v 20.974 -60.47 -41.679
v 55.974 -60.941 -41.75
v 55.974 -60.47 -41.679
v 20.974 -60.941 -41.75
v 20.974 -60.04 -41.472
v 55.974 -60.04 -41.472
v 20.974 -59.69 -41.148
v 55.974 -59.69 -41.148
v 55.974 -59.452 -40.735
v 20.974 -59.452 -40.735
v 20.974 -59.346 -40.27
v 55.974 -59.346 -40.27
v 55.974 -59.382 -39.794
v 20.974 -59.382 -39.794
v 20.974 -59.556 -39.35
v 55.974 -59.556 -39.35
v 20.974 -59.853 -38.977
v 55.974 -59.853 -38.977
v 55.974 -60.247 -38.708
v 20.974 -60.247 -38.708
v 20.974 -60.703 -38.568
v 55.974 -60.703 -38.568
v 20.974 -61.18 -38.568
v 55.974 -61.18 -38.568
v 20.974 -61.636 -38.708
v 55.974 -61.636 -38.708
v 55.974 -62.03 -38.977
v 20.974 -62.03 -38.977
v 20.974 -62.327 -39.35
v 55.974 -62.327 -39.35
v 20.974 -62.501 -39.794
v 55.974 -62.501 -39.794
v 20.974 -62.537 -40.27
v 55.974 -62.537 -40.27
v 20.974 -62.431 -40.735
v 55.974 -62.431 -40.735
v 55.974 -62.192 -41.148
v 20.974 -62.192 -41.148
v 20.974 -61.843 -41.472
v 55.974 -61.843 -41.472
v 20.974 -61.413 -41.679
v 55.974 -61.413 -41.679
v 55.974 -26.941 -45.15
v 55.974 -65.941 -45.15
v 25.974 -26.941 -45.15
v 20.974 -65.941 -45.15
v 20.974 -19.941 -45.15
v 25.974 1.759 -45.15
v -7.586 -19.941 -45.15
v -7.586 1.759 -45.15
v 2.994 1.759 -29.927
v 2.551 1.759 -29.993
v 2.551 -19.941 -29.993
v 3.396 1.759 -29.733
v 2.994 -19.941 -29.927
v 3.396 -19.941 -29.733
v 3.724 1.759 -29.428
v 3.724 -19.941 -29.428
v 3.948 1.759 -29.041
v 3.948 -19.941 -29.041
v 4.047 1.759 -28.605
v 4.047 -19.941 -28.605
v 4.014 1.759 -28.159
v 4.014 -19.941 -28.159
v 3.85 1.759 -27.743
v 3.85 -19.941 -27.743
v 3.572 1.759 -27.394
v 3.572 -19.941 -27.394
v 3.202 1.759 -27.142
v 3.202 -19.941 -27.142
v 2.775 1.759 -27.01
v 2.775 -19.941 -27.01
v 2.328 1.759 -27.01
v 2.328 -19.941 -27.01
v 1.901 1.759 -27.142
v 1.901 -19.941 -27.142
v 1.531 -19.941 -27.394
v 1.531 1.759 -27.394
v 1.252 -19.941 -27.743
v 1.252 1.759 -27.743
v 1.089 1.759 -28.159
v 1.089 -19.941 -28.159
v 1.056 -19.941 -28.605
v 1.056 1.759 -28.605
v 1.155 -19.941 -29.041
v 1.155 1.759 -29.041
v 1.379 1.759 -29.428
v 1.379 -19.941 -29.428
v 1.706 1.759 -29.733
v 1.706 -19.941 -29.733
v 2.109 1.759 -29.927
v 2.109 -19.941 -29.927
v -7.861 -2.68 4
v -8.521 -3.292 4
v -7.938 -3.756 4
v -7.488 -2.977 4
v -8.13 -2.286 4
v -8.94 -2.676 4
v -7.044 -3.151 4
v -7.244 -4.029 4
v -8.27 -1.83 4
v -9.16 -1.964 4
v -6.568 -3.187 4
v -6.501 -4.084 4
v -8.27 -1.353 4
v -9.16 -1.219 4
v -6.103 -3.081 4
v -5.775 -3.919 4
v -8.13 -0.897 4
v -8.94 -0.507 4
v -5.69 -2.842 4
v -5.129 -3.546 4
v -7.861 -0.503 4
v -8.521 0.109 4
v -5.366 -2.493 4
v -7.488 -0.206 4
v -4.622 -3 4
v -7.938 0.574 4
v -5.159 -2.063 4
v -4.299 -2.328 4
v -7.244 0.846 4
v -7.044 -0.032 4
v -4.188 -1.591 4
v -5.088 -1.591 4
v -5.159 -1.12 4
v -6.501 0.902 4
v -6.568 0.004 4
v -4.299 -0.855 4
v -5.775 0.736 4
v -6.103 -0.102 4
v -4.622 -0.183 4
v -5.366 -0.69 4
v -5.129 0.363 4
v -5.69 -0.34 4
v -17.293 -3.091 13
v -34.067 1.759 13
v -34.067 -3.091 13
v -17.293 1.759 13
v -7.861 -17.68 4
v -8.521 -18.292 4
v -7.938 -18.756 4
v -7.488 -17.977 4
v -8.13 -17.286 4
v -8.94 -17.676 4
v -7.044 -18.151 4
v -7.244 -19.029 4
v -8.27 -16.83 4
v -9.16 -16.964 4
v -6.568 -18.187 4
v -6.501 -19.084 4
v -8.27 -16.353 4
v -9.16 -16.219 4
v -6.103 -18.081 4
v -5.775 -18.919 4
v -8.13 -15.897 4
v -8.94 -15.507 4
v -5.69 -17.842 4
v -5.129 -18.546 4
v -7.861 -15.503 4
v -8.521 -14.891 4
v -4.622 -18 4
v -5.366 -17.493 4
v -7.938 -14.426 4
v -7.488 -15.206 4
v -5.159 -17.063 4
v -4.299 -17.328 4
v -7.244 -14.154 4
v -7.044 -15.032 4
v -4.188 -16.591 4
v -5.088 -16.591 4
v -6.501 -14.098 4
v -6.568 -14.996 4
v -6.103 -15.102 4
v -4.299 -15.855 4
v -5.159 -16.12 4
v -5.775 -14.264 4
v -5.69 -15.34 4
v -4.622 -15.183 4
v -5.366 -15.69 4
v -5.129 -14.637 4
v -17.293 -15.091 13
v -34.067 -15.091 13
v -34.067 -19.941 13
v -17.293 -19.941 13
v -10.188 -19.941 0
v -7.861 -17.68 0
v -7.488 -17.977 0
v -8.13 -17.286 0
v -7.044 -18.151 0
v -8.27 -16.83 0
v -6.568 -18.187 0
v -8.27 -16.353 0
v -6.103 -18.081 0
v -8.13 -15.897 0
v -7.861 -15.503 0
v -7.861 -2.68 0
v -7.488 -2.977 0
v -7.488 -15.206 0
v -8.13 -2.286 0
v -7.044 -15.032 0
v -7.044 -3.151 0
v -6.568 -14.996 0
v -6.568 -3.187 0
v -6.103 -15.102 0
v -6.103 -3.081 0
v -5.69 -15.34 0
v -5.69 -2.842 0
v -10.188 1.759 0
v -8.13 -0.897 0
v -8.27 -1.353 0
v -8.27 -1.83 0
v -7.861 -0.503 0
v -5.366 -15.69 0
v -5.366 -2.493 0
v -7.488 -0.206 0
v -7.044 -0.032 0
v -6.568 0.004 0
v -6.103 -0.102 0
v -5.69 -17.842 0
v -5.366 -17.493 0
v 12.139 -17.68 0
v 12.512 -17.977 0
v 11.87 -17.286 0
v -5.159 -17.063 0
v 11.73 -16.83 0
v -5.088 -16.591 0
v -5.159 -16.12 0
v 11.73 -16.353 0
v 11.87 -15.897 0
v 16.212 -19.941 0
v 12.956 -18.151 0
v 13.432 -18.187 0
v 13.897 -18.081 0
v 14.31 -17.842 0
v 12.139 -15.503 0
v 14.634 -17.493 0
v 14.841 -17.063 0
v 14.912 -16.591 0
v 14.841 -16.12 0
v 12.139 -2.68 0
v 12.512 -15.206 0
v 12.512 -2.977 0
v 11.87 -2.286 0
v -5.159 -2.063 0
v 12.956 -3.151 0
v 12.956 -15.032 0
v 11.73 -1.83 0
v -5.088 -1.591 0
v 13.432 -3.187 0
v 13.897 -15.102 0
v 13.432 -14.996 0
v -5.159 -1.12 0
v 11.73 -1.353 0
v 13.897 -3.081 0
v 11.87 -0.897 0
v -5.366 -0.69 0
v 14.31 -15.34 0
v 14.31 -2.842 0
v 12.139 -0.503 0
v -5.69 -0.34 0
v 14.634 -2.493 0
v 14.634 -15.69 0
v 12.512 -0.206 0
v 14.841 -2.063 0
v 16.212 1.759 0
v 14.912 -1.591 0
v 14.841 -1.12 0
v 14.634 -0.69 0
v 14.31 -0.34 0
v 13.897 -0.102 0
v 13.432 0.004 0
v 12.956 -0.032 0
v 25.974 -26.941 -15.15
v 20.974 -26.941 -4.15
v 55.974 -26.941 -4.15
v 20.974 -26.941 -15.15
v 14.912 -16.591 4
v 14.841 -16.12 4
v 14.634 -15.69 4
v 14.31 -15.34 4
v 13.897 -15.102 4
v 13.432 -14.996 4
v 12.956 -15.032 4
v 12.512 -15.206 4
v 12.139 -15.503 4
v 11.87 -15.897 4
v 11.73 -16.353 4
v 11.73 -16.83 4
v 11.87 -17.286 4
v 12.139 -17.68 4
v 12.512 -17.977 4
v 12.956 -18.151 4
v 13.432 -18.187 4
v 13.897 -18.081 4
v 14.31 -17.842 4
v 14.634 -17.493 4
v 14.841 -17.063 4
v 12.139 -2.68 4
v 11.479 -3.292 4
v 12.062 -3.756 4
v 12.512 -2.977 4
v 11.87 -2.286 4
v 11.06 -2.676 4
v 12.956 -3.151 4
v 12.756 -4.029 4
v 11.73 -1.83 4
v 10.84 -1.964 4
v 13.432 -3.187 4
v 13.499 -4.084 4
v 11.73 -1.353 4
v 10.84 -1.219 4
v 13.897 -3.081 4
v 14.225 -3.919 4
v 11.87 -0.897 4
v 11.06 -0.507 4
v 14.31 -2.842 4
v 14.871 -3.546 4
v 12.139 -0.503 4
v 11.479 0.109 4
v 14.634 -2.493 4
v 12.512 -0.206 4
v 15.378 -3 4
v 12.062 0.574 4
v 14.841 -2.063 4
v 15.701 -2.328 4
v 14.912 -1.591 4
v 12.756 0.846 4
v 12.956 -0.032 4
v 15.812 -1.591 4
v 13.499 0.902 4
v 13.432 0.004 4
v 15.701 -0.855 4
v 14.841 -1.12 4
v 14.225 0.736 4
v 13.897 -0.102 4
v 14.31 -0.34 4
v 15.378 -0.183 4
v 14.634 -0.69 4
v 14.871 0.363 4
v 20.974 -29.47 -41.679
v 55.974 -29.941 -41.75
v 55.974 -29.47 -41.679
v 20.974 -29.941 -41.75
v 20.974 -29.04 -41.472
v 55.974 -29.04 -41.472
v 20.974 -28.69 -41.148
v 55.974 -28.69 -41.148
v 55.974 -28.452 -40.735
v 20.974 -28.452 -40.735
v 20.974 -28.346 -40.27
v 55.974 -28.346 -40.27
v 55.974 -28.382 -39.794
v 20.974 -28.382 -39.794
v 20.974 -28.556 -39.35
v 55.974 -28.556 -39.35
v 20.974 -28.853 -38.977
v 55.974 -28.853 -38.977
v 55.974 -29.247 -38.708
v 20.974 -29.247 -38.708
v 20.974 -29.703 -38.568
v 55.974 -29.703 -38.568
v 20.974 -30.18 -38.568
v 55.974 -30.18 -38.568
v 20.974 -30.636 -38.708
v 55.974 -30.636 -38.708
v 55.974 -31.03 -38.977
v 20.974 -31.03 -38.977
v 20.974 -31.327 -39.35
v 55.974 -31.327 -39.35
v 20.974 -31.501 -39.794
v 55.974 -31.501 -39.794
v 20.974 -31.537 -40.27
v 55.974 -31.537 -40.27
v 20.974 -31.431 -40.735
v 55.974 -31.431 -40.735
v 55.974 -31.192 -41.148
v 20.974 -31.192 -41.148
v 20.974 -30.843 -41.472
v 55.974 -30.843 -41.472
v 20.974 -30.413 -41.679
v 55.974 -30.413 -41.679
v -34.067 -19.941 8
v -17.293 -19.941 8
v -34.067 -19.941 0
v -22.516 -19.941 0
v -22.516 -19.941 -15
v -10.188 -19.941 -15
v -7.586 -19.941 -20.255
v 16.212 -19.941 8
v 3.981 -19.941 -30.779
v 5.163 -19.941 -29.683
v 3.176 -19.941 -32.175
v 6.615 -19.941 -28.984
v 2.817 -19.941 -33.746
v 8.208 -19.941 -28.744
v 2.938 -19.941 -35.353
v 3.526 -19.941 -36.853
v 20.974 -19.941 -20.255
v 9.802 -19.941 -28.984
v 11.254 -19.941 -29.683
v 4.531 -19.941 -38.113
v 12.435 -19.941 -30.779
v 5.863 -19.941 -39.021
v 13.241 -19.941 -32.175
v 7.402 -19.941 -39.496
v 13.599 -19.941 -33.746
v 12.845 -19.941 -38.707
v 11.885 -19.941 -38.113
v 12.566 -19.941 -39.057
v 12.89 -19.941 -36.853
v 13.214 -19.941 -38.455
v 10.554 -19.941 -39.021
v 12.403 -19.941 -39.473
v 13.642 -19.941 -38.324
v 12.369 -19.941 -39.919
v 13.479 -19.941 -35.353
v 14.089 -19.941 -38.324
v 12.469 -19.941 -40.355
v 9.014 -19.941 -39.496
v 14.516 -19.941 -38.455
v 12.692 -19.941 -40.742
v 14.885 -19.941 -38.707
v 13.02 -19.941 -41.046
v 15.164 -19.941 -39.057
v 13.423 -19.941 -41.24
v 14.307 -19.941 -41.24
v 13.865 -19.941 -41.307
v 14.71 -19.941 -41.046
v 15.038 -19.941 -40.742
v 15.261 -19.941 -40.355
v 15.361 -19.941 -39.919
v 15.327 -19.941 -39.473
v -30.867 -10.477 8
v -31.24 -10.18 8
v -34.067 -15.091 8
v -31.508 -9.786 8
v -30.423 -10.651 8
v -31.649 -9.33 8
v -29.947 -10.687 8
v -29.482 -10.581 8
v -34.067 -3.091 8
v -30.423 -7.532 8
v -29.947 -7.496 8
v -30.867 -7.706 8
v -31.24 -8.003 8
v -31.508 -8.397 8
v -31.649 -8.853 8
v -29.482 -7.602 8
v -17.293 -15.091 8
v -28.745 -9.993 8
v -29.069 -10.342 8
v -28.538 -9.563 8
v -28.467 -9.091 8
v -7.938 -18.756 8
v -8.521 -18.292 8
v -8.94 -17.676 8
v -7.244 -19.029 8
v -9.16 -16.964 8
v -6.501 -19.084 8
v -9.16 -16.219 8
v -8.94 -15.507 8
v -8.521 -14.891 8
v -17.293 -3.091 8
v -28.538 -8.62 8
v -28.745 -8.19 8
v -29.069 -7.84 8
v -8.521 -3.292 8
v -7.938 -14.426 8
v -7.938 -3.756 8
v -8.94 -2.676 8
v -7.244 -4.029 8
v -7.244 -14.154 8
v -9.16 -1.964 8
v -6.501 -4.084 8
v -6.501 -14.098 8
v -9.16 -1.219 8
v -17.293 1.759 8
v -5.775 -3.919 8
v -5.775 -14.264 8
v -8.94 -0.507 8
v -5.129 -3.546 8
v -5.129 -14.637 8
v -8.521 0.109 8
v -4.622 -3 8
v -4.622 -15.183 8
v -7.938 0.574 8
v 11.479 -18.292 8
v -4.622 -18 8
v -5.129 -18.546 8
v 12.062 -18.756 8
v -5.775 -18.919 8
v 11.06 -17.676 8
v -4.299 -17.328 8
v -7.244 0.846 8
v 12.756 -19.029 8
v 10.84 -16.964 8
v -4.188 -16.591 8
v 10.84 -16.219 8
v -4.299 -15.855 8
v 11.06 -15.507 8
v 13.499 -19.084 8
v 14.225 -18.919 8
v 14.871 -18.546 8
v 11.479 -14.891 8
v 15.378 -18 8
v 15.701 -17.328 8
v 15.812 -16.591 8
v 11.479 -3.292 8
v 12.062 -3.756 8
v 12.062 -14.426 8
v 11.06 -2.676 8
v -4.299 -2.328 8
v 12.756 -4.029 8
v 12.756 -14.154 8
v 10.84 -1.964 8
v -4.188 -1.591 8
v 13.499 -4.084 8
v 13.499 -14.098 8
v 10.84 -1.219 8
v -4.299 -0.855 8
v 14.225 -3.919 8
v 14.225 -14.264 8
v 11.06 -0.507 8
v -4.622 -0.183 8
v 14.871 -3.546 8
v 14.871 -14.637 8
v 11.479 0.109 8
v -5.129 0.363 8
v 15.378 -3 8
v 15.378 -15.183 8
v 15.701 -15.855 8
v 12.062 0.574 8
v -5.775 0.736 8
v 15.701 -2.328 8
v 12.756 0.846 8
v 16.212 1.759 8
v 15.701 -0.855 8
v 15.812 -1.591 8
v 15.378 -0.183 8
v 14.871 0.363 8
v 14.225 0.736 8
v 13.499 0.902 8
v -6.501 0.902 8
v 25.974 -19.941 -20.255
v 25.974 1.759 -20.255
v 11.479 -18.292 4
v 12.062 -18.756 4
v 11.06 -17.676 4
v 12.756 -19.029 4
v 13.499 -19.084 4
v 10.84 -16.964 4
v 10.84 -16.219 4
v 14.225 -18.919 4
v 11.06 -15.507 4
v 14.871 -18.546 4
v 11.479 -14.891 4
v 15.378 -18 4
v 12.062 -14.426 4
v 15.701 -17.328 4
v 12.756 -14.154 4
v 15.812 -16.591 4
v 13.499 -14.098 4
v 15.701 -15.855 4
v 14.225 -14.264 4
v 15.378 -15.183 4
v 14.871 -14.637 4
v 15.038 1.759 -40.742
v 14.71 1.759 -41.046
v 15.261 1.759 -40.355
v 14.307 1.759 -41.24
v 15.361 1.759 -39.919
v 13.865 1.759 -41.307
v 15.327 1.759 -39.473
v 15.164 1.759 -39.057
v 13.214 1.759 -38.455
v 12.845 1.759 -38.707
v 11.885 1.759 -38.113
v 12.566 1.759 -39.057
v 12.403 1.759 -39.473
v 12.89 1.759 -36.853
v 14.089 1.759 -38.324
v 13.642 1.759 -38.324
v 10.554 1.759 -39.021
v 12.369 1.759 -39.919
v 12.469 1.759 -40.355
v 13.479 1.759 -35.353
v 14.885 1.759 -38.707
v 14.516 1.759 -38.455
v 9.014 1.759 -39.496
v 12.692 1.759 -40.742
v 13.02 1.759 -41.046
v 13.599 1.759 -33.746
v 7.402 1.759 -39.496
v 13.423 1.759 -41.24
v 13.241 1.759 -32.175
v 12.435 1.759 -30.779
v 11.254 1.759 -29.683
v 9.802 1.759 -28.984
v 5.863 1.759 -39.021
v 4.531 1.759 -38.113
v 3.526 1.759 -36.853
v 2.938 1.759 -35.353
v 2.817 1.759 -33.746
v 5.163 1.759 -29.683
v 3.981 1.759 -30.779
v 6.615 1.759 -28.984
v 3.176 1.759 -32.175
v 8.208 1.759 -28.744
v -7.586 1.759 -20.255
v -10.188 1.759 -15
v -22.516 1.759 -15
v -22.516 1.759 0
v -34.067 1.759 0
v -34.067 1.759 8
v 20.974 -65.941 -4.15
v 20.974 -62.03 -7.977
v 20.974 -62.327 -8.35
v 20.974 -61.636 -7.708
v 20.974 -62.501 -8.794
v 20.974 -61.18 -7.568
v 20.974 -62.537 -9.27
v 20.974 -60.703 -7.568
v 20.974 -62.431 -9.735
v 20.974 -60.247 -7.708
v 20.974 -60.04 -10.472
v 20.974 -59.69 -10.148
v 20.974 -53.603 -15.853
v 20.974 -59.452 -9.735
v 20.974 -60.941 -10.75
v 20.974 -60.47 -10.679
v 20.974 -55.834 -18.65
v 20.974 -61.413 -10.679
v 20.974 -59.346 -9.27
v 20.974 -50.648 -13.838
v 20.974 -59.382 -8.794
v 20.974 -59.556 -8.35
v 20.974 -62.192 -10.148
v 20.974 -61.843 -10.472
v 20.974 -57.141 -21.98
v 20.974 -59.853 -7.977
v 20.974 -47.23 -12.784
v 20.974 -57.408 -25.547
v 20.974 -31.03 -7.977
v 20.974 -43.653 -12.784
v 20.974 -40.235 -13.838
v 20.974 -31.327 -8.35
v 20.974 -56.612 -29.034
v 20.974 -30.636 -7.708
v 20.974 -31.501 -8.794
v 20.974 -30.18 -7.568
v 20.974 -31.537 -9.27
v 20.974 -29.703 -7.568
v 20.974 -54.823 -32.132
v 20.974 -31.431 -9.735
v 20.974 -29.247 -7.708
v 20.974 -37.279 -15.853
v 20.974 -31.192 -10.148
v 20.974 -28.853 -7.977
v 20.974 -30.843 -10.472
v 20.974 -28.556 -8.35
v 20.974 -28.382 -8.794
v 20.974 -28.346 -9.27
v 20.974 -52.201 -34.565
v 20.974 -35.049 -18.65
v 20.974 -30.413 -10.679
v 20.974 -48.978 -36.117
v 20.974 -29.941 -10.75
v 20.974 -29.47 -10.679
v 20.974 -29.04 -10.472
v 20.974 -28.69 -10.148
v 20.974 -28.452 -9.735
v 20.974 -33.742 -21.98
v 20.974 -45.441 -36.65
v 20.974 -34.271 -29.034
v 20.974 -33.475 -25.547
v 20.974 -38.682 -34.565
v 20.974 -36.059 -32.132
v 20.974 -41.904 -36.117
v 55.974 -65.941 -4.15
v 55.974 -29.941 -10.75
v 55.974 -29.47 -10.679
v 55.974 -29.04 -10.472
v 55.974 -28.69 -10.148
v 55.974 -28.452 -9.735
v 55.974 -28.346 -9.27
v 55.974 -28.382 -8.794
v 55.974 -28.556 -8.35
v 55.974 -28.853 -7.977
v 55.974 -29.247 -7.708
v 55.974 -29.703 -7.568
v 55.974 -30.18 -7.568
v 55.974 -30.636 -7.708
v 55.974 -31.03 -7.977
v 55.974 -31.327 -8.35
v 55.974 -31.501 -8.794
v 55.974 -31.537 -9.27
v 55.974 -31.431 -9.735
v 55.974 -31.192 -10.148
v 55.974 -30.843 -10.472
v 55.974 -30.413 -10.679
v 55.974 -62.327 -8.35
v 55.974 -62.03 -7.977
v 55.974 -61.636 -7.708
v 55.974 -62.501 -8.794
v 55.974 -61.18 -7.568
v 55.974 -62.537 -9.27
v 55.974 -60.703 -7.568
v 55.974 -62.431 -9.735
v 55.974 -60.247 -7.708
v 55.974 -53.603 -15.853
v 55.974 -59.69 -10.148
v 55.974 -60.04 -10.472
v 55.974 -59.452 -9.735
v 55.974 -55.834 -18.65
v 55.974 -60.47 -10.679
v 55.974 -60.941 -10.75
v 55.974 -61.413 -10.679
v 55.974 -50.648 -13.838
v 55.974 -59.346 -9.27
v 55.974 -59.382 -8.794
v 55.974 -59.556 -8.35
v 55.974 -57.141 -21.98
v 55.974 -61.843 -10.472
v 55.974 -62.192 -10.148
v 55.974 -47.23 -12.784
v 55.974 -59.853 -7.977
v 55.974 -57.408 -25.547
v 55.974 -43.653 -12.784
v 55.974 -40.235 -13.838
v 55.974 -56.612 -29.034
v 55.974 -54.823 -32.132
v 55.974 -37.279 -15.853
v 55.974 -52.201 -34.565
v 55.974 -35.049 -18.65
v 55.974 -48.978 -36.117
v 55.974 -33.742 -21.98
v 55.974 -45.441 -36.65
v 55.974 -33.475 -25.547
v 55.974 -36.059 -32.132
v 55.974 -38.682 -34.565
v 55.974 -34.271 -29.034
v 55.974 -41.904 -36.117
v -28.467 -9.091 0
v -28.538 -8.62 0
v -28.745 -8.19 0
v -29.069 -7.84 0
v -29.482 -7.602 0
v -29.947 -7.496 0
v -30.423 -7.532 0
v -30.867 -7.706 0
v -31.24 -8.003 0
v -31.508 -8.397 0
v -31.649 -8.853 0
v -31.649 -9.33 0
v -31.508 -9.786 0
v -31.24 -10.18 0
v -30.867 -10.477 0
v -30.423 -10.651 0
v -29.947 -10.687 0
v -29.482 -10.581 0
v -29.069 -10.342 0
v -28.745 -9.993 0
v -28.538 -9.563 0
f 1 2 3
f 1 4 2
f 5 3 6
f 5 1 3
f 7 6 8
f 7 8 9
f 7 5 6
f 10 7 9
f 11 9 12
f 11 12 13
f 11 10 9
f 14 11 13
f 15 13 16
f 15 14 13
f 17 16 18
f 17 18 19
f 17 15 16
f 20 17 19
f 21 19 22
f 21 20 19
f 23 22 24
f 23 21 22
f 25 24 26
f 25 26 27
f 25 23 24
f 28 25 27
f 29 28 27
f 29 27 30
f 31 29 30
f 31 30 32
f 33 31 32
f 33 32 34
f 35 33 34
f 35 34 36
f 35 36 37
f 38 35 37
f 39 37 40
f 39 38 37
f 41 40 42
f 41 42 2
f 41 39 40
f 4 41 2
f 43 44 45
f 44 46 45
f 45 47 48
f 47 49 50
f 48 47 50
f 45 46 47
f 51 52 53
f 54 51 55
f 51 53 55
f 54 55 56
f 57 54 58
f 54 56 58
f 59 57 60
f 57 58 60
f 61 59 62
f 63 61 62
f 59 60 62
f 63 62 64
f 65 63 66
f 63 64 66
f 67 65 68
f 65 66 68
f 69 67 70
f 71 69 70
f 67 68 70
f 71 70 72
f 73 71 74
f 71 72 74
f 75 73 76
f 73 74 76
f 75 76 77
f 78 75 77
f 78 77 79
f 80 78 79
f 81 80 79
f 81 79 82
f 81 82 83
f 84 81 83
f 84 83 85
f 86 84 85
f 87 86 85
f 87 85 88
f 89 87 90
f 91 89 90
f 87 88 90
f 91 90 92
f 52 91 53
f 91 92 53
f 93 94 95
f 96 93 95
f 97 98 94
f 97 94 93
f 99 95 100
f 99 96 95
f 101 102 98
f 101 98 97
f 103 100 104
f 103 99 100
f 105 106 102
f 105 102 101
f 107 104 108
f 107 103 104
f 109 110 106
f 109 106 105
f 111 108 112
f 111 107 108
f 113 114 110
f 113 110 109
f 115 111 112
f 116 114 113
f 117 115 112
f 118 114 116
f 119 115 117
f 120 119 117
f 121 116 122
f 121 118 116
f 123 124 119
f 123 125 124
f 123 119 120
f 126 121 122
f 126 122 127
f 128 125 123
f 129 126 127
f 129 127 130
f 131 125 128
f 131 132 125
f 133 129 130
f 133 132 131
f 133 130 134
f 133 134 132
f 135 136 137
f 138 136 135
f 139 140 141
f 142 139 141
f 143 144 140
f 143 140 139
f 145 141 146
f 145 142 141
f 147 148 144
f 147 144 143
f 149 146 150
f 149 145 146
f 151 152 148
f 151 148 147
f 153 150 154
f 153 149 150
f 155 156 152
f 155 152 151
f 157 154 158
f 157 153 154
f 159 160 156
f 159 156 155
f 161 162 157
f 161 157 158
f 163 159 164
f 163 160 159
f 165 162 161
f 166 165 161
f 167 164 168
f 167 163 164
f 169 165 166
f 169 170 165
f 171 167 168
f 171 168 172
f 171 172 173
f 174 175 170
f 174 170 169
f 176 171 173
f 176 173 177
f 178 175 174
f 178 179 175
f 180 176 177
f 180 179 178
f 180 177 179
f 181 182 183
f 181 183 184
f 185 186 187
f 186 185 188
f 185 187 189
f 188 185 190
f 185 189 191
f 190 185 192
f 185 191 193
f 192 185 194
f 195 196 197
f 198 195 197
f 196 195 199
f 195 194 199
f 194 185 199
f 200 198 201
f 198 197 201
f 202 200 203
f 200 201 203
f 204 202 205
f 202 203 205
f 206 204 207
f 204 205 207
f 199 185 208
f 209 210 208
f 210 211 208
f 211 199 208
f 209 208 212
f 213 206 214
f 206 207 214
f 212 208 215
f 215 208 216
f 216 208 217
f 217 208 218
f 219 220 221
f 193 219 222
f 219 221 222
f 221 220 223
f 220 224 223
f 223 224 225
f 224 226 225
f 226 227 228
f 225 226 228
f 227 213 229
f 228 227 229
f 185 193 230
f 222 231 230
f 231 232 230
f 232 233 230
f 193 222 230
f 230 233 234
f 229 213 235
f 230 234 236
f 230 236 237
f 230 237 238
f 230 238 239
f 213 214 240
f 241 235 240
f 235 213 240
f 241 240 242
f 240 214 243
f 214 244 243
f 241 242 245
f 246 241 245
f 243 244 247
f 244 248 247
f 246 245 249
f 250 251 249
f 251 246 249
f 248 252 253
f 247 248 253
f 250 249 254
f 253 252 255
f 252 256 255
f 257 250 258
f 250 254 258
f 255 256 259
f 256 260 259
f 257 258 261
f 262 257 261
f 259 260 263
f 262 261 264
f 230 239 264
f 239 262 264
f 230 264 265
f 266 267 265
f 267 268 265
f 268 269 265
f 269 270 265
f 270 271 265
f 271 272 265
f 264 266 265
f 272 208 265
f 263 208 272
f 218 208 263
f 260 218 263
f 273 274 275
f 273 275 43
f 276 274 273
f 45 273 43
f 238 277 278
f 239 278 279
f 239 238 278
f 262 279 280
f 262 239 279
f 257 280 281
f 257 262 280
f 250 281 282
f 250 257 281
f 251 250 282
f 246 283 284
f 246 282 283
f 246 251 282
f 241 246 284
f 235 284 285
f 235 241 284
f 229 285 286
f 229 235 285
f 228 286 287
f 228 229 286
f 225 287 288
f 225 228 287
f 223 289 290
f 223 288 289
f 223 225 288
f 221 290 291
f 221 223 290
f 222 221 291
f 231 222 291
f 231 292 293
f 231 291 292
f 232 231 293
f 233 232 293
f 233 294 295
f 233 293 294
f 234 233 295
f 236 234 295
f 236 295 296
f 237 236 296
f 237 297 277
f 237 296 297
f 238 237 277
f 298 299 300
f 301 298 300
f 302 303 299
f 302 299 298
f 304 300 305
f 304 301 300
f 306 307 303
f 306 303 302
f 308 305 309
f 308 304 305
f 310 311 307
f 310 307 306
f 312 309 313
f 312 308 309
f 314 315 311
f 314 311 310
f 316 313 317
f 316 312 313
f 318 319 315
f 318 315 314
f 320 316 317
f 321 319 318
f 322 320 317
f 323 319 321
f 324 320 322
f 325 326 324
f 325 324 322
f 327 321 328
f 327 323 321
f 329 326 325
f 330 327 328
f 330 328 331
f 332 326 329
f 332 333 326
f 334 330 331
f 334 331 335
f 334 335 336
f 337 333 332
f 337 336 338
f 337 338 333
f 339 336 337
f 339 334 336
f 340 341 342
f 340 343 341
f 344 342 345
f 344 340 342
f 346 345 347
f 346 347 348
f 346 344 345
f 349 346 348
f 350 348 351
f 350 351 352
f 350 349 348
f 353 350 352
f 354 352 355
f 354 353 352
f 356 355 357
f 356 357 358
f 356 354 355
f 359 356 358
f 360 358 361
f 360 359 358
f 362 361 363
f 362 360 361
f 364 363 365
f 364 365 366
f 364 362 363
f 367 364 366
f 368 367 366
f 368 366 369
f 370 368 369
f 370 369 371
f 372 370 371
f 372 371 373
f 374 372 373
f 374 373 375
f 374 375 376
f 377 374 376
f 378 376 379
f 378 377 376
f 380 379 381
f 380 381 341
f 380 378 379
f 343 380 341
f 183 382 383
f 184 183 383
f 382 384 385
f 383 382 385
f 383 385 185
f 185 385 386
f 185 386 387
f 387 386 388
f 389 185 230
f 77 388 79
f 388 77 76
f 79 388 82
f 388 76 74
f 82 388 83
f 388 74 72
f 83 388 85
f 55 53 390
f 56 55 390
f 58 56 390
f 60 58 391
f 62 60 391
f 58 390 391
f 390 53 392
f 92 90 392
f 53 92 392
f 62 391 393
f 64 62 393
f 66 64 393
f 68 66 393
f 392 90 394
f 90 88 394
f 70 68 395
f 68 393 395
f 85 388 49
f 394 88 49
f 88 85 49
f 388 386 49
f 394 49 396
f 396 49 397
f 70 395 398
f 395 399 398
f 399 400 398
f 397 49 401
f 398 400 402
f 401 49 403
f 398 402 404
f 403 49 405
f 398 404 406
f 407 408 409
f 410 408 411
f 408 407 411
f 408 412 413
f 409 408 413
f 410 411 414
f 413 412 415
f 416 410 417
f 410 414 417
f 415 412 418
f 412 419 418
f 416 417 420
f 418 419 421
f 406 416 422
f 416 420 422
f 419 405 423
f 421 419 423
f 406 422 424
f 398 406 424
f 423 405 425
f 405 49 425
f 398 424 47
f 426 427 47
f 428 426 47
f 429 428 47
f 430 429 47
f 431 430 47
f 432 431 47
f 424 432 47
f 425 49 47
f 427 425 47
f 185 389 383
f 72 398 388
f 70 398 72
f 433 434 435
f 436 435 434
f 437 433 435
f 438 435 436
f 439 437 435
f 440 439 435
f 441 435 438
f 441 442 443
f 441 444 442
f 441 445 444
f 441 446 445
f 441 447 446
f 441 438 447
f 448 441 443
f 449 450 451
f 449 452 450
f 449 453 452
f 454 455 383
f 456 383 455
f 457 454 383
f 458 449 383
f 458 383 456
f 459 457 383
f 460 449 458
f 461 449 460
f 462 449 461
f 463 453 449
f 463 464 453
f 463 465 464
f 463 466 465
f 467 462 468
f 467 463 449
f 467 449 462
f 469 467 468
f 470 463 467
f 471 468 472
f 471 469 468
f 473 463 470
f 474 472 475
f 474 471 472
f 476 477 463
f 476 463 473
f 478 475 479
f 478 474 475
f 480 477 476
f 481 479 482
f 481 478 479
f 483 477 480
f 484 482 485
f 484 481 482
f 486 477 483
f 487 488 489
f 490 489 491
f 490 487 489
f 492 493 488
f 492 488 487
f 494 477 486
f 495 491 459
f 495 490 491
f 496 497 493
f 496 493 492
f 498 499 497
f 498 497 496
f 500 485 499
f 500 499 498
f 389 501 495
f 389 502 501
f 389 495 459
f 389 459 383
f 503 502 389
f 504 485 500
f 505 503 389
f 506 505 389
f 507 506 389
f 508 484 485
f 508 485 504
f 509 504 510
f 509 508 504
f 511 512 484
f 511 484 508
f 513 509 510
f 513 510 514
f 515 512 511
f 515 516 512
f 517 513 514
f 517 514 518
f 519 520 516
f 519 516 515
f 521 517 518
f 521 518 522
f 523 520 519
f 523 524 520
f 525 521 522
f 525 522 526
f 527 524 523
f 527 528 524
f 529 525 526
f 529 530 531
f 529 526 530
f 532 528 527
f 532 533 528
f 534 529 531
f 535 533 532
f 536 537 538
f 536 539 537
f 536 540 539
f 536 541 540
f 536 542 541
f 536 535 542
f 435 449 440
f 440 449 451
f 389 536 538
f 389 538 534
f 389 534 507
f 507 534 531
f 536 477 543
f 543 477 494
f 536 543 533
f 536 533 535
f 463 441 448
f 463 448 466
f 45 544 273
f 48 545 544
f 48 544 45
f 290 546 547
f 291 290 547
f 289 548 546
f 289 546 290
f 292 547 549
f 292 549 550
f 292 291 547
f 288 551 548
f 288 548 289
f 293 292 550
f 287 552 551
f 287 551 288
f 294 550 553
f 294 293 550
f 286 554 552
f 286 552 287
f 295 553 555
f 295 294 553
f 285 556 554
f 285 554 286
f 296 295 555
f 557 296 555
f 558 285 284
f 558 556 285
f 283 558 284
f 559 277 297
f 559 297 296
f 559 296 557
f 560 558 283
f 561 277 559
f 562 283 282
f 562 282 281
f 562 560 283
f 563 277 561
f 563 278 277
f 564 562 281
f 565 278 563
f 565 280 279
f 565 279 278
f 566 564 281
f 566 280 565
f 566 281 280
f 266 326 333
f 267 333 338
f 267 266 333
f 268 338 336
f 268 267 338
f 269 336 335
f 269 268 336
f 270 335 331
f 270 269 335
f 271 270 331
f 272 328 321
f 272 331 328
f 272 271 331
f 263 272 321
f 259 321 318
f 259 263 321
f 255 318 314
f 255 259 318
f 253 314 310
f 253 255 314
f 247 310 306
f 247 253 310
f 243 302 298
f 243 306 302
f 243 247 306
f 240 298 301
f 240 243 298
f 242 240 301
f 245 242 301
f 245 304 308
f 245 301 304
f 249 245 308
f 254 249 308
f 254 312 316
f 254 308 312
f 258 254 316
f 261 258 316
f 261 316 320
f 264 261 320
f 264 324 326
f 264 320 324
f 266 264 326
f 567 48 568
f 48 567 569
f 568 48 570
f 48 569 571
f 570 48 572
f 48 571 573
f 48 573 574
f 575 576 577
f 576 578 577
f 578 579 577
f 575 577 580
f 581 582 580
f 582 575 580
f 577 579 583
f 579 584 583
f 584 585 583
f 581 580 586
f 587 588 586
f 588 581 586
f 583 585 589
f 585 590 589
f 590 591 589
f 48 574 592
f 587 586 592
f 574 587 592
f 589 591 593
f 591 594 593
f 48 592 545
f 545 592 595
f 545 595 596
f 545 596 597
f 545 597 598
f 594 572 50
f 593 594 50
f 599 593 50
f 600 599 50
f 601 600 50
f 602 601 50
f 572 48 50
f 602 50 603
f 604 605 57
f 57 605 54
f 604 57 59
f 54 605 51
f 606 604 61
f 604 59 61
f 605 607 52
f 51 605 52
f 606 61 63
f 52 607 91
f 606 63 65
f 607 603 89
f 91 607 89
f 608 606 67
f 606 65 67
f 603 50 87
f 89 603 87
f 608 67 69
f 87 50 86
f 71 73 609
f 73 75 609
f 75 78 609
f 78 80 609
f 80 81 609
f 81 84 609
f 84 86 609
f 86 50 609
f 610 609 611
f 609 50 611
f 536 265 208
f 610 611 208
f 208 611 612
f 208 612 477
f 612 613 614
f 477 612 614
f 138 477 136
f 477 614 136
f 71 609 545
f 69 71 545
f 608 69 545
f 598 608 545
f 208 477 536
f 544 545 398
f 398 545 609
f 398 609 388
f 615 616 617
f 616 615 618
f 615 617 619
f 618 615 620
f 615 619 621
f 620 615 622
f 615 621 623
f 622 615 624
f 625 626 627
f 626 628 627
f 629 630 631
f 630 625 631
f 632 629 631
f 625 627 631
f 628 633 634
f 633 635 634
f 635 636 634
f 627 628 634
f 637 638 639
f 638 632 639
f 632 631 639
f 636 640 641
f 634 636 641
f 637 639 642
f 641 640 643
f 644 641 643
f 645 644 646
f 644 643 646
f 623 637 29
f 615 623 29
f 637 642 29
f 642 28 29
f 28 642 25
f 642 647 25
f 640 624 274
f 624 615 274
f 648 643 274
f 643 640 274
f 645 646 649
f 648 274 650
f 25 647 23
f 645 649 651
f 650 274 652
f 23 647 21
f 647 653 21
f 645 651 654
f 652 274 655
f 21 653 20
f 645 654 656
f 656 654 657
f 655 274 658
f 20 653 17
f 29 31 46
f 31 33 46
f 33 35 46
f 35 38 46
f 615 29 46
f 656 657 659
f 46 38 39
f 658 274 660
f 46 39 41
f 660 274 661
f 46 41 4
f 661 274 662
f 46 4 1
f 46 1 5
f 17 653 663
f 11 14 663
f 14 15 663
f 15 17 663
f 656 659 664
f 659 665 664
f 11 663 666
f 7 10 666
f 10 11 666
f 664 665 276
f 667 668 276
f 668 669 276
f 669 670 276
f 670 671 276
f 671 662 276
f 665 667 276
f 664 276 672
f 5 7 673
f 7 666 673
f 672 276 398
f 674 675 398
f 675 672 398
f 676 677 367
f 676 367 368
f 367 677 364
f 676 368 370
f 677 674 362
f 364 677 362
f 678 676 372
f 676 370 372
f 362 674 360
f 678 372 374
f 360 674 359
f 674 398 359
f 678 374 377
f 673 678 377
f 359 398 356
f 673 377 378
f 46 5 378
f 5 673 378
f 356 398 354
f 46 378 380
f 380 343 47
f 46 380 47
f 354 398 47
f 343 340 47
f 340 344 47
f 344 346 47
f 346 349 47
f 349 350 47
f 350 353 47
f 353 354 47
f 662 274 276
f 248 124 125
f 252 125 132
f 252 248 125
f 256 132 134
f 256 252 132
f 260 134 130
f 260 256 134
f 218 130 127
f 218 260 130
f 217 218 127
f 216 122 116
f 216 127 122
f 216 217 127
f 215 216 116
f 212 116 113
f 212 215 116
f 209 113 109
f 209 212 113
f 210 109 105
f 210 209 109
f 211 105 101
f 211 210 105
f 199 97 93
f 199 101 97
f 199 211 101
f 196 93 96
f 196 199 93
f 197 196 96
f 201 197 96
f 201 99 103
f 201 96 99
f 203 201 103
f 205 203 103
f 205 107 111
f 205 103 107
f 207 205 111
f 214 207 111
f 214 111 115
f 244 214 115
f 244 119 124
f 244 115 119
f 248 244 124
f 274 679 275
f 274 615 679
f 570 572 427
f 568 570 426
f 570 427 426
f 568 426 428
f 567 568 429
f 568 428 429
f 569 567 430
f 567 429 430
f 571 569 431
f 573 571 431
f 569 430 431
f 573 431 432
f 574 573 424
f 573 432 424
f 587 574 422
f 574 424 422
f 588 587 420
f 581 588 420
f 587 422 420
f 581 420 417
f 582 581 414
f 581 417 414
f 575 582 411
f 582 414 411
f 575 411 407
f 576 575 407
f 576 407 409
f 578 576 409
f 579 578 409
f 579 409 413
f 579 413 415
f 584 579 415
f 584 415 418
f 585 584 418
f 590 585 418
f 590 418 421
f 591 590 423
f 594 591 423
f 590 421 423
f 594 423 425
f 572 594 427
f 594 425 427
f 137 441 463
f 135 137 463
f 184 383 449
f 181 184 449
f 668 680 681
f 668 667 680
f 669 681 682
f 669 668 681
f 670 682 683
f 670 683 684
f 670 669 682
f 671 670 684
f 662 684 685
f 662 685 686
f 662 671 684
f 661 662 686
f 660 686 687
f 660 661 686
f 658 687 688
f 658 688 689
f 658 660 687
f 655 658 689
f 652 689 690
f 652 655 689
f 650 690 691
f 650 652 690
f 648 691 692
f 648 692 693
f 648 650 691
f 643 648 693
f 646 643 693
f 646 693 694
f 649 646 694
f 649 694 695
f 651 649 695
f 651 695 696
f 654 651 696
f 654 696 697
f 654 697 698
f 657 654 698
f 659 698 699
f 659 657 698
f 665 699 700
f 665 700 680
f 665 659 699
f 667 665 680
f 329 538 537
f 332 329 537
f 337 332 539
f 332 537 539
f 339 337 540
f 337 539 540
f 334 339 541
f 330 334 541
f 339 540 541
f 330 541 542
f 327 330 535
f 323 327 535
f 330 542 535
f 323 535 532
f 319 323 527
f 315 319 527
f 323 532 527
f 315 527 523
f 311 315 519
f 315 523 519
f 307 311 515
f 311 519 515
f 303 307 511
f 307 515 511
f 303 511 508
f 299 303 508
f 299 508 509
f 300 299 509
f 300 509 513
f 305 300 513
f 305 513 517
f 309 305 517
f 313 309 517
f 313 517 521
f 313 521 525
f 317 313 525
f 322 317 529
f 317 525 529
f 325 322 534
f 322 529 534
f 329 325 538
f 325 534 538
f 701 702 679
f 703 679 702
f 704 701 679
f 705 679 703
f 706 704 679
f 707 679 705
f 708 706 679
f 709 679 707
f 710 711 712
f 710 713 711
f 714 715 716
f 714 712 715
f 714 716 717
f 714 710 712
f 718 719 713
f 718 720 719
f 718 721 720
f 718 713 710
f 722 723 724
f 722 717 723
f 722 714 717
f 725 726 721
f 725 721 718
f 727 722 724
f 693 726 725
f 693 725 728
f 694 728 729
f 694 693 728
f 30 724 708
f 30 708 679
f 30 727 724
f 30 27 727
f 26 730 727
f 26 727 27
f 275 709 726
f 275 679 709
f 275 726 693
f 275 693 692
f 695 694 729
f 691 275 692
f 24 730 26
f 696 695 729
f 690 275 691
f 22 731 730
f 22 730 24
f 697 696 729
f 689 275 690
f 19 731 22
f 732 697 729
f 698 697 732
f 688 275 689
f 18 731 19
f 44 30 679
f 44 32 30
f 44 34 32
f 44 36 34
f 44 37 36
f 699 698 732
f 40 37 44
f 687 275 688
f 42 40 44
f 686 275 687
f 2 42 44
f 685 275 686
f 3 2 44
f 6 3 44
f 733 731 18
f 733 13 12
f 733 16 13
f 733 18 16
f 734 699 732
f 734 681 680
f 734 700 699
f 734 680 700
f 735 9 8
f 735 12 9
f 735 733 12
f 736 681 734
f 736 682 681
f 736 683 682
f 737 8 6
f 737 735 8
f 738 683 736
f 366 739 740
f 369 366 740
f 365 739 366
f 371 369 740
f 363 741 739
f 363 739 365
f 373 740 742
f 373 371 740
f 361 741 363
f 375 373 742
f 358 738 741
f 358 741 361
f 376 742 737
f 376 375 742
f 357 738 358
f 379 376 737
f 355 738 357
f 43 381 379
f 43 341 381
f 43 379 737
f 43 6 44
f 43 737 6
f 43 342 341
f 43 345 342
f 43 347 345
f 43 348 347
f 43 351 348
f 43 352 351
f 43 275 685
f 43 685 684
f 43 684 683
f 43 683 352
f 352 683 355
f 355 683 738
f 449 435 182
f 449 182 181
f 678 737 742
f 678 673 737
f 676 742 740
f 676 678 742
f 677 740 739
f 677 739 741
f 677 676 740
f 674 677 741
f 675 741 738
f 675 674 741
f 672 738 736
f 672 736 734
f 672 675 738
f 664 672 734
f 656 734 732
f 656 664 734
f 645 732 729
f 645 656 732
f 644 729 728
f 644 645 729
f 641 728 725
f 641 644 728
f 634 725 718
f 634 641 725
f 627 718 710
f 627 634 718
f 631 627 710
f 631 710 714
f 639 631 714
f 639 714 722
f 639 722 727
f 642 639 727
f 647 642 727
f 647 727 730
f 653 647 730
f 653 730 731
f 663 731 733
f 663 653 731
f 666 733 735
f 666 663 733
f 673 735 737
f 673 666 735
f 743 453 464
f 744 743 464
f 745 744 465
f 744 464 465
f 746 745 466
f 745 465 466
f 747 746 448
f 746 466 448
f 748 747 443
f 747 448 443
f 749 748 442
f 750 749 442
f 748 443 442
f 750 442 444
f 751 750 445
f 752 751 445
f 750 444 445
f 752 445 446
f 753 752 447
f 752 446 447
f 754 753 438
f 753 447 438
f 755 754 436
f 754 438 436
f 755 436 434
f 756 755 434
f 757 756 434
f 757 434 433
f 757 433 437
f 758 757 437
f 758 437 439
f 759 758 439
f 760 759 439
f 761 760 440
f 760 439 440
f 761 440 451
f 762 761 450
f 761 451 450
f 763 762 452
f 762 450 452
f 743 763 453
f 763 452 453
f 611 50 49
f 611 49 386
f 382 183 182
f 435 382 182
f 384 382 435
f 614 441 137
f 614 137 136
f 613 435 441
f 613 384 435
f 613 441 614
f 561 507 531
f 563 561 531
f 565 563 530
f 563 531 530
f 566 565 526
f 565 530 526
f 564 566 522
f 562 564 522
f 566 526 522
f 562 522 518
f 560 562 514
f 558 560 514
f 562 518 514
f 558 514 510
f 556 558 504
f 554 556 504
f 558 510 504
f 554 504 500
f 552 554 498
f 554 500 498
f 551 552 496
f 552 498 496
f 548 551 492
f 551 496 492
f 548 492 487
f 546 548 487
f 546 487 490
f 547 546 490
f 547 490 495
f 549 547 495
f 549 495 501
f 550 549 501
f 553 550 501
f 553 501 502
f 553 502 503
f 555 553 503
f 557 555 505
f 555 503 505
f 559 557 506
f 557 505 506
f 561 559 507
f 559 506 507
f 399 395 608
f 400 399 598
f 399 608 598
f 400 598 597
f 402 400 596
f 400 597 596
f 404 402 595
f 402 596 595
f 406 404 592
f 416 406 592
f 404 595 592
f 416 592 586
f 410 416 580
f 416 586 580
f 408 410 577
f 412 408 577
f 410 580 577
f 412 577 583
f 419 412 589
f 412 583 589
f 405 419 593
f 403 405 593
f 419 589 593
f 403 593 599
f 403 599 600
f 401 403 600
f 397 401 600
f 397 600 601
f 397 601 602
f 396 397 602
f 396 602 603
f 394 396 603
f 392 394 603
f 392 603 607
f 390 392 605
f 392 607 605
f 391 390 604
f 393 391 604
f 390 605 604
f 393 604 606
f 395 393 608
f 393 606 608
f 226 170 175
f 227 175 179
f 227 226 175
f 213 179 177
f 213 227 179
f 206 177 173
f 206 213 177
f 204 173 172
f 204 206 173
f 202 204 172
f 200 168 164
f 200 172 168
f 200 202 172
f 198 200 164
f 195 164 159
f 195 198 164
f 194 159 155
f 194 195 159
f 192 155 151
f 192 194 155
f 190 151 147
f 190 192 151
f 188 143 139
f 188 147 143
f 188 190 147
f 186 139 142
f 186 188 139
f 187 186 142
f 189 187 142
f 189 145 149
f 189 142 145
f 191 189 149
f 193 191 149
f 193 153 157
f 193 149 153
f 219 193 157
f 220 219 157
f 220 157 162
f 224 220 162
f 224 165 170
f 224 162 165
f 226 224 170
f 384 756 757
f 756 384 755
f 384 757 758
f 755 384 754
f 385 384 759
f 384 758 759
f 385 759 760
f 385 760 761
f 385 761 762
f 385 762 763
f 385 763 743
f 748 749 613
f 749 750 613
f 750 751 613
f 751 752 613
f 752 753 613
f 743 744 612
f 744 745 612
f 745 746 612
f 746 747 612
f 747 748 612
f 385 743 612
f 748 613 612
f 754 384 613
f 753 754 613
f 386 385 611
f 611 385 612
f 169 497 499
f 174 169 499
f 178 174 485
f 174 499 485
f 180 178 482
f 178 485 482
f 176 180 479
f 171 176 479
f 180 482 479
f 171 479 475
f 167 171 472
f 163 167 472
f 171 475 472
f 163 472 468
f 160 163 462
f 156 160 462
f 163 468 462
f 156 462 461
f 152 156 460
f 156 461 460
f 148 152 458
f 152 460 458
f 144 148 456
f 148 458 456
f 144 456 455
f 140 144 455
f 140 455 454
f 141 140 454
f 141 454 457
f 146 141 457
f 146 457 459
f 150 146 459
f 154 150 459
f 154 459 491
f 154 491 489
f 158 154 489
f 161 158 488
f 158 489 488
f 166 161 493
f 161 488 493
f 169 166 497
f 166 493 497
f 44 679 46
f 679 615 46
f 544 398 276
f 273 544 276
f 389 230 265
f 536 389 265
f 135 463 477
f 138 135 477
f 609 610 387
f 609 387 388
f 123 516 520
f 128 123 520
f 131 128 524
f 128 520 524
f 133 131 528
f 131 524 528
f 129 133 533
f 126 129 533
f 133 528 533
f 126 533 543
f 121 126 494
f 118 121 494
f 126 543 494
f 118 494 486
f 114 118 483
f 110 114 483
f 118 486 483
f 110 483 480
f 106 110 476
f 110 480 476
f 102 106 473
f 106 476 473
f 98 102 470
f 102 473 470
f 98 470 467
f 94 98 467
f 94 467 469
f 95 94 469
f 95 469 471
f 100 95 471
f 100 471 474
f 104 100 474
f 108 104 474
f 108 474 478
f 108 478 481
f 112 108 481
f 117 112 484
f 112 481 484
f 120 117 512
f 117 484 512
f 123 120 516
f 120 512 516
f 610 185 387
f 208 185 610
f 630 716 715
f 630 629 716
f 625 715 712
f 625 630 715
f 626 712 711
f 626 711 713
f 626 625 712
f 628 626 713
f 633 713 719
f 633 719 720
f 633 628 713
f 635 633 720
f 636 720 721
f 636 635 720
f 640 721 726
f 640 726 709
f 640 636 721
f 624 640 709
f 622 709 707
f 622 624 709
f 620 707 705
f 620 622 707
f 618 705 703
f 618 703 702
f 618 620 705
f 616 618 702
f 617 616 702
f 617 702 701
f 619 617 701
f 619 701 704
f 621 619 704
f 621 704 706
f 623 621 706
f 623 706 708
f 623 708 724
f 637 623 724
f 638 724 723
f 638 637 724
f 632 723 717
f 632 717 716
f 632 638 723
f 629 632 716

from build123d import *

# Parameters (mm, degrees)
SKICA1_W                 = 50.278910674
SKICA1_H                 = 21.7
SKICA1_R                 = 1.6
P_IDAT_VYSUNUT_M1_DEPTH  = 8
SKICA2_R                 = 2.5
ODEBRAT_VYSUNUT_M1_DEPTH = 4
SKICA3_R                 = 1.6
ODEBRAT_VYSUNUT_M2_DEPTH = 8
SKICA4_W                 = 12.327690559
SKICA4_H                 = 21.7
P_IDAT_VYSUNUT_M2_DEPTH  = 15
SKICA6_R                 = 5.406276896
P_IDAT_VYSUNUT_M3_DEPTH  = 21.7
SKICA7_R                 = 1.5
ODEBRAT_VYSUNUT_M3_DEPTH = 21.7
SKICA9_R                 = 1.6
SKICA9_R_2               = 12
P_IDAT_VYSUNUT_M4_DEPTH  = 5
SKICA10_W                = 41
SKICA10_H                = 39
SKICA10_R                = 12
SKICA10_R_2              = 1.6
P_IDAT_VYSUNUT_M5_DEPTH  = 30
SKICA11_W                = 16.773929501
SKICA11_H                = 4.85
P_IDAT_VYSUNUT_M6_DEPTH  = 5


with BuildPart() as part:
    # Skica1 → Přidat vysunutím1 (new body)
    with BuildSketch(Plane.XY):
        with Locations((-8.927473885, -9.09140889)):
            Rectangle(SKICA1_W, SKICA1_H)
        with Locations((13.311981452, -16.59140889)):
            Circle(SKICA1_R, mode=Mode.SUBTRACT)
        with Locations((-6.688018548, -16.59140889)):
            Circle(SKICA1_R, mode=Mode.SUBTRACT)
        with Locations((-6.688018548, -1.59140889)):
            Circle(SKICA1_R, mode=Mode.SUBTRACT)
        with Locations((13.311981452, -1.59140889)):
            Circle(SKICA1_R, mode=Mode.SUBTRACT)
    extrude(amount=P_IDAT_VYSUNUT_M1_DEPTH)

    # Skica2 → Odebrat vysunutím1 (cut)
    with BuildSketch(Plane.XY.offset(8)):
        with Locations((13.311981452, -16.59140889)):
            Circle(SKICA2_R)
        with Locations((-6.688018548, -16.59140889)):
            Circle(SKICA2_R)
        with Locations((-6.688018548, -1.59140889)):
            Circle(SKICA2_R)
        with Locations((13.311981452, -1.59140889)):
            Circle(SKICA2_R)
    extrude(amount=-ODEBRAT_VYSUNUT_M1_DEPTH, mode=Mode.SUBTRACT)

    # Skica3 → Odebrat vysunutím2 (cut)
    with BuildSketch(Plane.XY.offset(8)):
        with Locations((-30.066929222, -9.09140889)):
            Circle(SKICA3_R)
    extrude(amount=-ODEBRAT_VYSUNUT_M2_DEPTH, mode=Mode.SUBTRACT)

    # Skica4 → Přidat vysunutím2 (add)
    with BuildSketch(Plane(origin=(0, 0, 0), x_dir=(-1, 0, 0), z_dir=(0, 0, -1))):
        with Locations((16.351863828, -9.09140889)):
            Rectangle(SKICA4_W, SKICA4_H)
    extrude(amount=P_IDAT_VYSUNUT_M2_DEPTH)

    # Skica6 → Přidat vysunutím3 (add)
    with BuildSketch(Plane(origin=(0, 1.75859111, 0), x_dir=(1, 0, 0), z_dir=(0, 1, 0))):
        Polygon((-22.515709107, 15), (-10.188018548, 15), (-7.585826442, 20.254970434), (20.97371307, 20.254970434), (20.97371307, 45.15), (4.741864117, 45.15), (-7.585826442, 45.15), align=None)
        with Locations(Location((8.208247023, 34.15, 0), (0, 0, 270))):
            Circle(SKICA6_R, mode=Mode.SUBTRACT)
    extrude(amount=-P_IDAT_VYSUNUT_M3_DEPTH)

    # Skica7 → Odebrat vysunutím3 (cut)
    with BuildSketch(Plane.XZ.offset(19.94140889)):
        with Locations(Location((2.551392773, -28.493145751, 0), (0, 0, 270))):
            Circle(SKICA7_R)
        with Locations(Location((13.865101272, -39.806854249, 0), (0, 0, 270))):
            Circle(SKICA7_R)
    extrude(amount=-ODEBRAT_VYSUNUT_M3_DEPTH, mode=Mode.SUBTRACT)

    # Skica9 → Přidat vysunutím4 (add)
    with BuildSketch(Plane(origin=(20.97371307, 0, 0), x_dir=(0, 0, -1), z_dir=(1, 0, 0))):
        Polygon((45.15, 1.75859111), (20.254970434, 1.75859111), (20.254970434, -19.94140889), (15.15, -26.94140889), (4.15, -26.94140889), (4.15, -65.94140889), (15.15, -65.94140889), (45.15, -65.94140889), (45.15, -19.94140889), align=None)
        with Locations((40.15, -60.94140889)):
            Circle(SKICA9_R, mode=Mode.SUBTRACT)
        with Locations((9.15, -60.94140889)):
            Circle(SKICA9_R, mode=Mode.SUBTRACT)
        with Locations((9.15, -29.94140889)):
            Circle(SKICA9_R, mode=Mode.SUBTRACT)
        with Locations((40.15, -29.94140889)):
            Circle(SKICA9_R, mode=Mode.SUBTRACT)
        with Locations((24.65, -45.44140889)):
            Circle(SKICA9_R_2, mode=Mode.SUBTRACT)
    extrude(amount=P_IDAT_VYSUNUT_M4_DEPTH)

    # Skica10 → Přidat vysunutím5 (add)
    with BuildSketch(Plane(origin=(25.97371307, 0, 0), x_dir=(0, 0, -1), z_dir=(1, 0, 0))):
        with Locations((24.65, -46.44140889)):
            Rectangle(SKICA10_W, SKICA10_H)
        with Locations((24.65, -45.44140889)):
            Circle(SKICA10_R, mode=Mode.SUBTRACT)
        with Locations((40.15, -60.94140889)):
            Circle(SKICA10_R_2, mode=Mode.SUBTRACT)
        with Locations((40.15, -29.94140889)):
            Circle(SKICA10_R_2, mode=Mode.SUBTRACT)
        with Locations((9.15, -29.94140889)):
            Circle(SKICA10_R_2, mode=Mode.SUBTRACT)
        with Locations((9.15, -60.94140889)):
            Circle(SKICA10_R_2, mode=Mode.SUBTRACT)
    extrude(amount=P_IDAT_VYSUNUT_M5_DEPTH)

    # Skica11 → Přidat vysunutím6 (add)
    with BuildSketch(Plane.XY.offset(8)):
        with Locations((-25.679964471, -17.51640889)):
            Rectangle(SKICA11_W, SKICA11_H)
        with Locations((-25.679964471, -0.66640889)):
            Rectangle(SKICA11_W, SKICA11_H)
    extrude(amount=P_IDAT_VYSUNUT_M6_DEPTH)


solid = part.part
